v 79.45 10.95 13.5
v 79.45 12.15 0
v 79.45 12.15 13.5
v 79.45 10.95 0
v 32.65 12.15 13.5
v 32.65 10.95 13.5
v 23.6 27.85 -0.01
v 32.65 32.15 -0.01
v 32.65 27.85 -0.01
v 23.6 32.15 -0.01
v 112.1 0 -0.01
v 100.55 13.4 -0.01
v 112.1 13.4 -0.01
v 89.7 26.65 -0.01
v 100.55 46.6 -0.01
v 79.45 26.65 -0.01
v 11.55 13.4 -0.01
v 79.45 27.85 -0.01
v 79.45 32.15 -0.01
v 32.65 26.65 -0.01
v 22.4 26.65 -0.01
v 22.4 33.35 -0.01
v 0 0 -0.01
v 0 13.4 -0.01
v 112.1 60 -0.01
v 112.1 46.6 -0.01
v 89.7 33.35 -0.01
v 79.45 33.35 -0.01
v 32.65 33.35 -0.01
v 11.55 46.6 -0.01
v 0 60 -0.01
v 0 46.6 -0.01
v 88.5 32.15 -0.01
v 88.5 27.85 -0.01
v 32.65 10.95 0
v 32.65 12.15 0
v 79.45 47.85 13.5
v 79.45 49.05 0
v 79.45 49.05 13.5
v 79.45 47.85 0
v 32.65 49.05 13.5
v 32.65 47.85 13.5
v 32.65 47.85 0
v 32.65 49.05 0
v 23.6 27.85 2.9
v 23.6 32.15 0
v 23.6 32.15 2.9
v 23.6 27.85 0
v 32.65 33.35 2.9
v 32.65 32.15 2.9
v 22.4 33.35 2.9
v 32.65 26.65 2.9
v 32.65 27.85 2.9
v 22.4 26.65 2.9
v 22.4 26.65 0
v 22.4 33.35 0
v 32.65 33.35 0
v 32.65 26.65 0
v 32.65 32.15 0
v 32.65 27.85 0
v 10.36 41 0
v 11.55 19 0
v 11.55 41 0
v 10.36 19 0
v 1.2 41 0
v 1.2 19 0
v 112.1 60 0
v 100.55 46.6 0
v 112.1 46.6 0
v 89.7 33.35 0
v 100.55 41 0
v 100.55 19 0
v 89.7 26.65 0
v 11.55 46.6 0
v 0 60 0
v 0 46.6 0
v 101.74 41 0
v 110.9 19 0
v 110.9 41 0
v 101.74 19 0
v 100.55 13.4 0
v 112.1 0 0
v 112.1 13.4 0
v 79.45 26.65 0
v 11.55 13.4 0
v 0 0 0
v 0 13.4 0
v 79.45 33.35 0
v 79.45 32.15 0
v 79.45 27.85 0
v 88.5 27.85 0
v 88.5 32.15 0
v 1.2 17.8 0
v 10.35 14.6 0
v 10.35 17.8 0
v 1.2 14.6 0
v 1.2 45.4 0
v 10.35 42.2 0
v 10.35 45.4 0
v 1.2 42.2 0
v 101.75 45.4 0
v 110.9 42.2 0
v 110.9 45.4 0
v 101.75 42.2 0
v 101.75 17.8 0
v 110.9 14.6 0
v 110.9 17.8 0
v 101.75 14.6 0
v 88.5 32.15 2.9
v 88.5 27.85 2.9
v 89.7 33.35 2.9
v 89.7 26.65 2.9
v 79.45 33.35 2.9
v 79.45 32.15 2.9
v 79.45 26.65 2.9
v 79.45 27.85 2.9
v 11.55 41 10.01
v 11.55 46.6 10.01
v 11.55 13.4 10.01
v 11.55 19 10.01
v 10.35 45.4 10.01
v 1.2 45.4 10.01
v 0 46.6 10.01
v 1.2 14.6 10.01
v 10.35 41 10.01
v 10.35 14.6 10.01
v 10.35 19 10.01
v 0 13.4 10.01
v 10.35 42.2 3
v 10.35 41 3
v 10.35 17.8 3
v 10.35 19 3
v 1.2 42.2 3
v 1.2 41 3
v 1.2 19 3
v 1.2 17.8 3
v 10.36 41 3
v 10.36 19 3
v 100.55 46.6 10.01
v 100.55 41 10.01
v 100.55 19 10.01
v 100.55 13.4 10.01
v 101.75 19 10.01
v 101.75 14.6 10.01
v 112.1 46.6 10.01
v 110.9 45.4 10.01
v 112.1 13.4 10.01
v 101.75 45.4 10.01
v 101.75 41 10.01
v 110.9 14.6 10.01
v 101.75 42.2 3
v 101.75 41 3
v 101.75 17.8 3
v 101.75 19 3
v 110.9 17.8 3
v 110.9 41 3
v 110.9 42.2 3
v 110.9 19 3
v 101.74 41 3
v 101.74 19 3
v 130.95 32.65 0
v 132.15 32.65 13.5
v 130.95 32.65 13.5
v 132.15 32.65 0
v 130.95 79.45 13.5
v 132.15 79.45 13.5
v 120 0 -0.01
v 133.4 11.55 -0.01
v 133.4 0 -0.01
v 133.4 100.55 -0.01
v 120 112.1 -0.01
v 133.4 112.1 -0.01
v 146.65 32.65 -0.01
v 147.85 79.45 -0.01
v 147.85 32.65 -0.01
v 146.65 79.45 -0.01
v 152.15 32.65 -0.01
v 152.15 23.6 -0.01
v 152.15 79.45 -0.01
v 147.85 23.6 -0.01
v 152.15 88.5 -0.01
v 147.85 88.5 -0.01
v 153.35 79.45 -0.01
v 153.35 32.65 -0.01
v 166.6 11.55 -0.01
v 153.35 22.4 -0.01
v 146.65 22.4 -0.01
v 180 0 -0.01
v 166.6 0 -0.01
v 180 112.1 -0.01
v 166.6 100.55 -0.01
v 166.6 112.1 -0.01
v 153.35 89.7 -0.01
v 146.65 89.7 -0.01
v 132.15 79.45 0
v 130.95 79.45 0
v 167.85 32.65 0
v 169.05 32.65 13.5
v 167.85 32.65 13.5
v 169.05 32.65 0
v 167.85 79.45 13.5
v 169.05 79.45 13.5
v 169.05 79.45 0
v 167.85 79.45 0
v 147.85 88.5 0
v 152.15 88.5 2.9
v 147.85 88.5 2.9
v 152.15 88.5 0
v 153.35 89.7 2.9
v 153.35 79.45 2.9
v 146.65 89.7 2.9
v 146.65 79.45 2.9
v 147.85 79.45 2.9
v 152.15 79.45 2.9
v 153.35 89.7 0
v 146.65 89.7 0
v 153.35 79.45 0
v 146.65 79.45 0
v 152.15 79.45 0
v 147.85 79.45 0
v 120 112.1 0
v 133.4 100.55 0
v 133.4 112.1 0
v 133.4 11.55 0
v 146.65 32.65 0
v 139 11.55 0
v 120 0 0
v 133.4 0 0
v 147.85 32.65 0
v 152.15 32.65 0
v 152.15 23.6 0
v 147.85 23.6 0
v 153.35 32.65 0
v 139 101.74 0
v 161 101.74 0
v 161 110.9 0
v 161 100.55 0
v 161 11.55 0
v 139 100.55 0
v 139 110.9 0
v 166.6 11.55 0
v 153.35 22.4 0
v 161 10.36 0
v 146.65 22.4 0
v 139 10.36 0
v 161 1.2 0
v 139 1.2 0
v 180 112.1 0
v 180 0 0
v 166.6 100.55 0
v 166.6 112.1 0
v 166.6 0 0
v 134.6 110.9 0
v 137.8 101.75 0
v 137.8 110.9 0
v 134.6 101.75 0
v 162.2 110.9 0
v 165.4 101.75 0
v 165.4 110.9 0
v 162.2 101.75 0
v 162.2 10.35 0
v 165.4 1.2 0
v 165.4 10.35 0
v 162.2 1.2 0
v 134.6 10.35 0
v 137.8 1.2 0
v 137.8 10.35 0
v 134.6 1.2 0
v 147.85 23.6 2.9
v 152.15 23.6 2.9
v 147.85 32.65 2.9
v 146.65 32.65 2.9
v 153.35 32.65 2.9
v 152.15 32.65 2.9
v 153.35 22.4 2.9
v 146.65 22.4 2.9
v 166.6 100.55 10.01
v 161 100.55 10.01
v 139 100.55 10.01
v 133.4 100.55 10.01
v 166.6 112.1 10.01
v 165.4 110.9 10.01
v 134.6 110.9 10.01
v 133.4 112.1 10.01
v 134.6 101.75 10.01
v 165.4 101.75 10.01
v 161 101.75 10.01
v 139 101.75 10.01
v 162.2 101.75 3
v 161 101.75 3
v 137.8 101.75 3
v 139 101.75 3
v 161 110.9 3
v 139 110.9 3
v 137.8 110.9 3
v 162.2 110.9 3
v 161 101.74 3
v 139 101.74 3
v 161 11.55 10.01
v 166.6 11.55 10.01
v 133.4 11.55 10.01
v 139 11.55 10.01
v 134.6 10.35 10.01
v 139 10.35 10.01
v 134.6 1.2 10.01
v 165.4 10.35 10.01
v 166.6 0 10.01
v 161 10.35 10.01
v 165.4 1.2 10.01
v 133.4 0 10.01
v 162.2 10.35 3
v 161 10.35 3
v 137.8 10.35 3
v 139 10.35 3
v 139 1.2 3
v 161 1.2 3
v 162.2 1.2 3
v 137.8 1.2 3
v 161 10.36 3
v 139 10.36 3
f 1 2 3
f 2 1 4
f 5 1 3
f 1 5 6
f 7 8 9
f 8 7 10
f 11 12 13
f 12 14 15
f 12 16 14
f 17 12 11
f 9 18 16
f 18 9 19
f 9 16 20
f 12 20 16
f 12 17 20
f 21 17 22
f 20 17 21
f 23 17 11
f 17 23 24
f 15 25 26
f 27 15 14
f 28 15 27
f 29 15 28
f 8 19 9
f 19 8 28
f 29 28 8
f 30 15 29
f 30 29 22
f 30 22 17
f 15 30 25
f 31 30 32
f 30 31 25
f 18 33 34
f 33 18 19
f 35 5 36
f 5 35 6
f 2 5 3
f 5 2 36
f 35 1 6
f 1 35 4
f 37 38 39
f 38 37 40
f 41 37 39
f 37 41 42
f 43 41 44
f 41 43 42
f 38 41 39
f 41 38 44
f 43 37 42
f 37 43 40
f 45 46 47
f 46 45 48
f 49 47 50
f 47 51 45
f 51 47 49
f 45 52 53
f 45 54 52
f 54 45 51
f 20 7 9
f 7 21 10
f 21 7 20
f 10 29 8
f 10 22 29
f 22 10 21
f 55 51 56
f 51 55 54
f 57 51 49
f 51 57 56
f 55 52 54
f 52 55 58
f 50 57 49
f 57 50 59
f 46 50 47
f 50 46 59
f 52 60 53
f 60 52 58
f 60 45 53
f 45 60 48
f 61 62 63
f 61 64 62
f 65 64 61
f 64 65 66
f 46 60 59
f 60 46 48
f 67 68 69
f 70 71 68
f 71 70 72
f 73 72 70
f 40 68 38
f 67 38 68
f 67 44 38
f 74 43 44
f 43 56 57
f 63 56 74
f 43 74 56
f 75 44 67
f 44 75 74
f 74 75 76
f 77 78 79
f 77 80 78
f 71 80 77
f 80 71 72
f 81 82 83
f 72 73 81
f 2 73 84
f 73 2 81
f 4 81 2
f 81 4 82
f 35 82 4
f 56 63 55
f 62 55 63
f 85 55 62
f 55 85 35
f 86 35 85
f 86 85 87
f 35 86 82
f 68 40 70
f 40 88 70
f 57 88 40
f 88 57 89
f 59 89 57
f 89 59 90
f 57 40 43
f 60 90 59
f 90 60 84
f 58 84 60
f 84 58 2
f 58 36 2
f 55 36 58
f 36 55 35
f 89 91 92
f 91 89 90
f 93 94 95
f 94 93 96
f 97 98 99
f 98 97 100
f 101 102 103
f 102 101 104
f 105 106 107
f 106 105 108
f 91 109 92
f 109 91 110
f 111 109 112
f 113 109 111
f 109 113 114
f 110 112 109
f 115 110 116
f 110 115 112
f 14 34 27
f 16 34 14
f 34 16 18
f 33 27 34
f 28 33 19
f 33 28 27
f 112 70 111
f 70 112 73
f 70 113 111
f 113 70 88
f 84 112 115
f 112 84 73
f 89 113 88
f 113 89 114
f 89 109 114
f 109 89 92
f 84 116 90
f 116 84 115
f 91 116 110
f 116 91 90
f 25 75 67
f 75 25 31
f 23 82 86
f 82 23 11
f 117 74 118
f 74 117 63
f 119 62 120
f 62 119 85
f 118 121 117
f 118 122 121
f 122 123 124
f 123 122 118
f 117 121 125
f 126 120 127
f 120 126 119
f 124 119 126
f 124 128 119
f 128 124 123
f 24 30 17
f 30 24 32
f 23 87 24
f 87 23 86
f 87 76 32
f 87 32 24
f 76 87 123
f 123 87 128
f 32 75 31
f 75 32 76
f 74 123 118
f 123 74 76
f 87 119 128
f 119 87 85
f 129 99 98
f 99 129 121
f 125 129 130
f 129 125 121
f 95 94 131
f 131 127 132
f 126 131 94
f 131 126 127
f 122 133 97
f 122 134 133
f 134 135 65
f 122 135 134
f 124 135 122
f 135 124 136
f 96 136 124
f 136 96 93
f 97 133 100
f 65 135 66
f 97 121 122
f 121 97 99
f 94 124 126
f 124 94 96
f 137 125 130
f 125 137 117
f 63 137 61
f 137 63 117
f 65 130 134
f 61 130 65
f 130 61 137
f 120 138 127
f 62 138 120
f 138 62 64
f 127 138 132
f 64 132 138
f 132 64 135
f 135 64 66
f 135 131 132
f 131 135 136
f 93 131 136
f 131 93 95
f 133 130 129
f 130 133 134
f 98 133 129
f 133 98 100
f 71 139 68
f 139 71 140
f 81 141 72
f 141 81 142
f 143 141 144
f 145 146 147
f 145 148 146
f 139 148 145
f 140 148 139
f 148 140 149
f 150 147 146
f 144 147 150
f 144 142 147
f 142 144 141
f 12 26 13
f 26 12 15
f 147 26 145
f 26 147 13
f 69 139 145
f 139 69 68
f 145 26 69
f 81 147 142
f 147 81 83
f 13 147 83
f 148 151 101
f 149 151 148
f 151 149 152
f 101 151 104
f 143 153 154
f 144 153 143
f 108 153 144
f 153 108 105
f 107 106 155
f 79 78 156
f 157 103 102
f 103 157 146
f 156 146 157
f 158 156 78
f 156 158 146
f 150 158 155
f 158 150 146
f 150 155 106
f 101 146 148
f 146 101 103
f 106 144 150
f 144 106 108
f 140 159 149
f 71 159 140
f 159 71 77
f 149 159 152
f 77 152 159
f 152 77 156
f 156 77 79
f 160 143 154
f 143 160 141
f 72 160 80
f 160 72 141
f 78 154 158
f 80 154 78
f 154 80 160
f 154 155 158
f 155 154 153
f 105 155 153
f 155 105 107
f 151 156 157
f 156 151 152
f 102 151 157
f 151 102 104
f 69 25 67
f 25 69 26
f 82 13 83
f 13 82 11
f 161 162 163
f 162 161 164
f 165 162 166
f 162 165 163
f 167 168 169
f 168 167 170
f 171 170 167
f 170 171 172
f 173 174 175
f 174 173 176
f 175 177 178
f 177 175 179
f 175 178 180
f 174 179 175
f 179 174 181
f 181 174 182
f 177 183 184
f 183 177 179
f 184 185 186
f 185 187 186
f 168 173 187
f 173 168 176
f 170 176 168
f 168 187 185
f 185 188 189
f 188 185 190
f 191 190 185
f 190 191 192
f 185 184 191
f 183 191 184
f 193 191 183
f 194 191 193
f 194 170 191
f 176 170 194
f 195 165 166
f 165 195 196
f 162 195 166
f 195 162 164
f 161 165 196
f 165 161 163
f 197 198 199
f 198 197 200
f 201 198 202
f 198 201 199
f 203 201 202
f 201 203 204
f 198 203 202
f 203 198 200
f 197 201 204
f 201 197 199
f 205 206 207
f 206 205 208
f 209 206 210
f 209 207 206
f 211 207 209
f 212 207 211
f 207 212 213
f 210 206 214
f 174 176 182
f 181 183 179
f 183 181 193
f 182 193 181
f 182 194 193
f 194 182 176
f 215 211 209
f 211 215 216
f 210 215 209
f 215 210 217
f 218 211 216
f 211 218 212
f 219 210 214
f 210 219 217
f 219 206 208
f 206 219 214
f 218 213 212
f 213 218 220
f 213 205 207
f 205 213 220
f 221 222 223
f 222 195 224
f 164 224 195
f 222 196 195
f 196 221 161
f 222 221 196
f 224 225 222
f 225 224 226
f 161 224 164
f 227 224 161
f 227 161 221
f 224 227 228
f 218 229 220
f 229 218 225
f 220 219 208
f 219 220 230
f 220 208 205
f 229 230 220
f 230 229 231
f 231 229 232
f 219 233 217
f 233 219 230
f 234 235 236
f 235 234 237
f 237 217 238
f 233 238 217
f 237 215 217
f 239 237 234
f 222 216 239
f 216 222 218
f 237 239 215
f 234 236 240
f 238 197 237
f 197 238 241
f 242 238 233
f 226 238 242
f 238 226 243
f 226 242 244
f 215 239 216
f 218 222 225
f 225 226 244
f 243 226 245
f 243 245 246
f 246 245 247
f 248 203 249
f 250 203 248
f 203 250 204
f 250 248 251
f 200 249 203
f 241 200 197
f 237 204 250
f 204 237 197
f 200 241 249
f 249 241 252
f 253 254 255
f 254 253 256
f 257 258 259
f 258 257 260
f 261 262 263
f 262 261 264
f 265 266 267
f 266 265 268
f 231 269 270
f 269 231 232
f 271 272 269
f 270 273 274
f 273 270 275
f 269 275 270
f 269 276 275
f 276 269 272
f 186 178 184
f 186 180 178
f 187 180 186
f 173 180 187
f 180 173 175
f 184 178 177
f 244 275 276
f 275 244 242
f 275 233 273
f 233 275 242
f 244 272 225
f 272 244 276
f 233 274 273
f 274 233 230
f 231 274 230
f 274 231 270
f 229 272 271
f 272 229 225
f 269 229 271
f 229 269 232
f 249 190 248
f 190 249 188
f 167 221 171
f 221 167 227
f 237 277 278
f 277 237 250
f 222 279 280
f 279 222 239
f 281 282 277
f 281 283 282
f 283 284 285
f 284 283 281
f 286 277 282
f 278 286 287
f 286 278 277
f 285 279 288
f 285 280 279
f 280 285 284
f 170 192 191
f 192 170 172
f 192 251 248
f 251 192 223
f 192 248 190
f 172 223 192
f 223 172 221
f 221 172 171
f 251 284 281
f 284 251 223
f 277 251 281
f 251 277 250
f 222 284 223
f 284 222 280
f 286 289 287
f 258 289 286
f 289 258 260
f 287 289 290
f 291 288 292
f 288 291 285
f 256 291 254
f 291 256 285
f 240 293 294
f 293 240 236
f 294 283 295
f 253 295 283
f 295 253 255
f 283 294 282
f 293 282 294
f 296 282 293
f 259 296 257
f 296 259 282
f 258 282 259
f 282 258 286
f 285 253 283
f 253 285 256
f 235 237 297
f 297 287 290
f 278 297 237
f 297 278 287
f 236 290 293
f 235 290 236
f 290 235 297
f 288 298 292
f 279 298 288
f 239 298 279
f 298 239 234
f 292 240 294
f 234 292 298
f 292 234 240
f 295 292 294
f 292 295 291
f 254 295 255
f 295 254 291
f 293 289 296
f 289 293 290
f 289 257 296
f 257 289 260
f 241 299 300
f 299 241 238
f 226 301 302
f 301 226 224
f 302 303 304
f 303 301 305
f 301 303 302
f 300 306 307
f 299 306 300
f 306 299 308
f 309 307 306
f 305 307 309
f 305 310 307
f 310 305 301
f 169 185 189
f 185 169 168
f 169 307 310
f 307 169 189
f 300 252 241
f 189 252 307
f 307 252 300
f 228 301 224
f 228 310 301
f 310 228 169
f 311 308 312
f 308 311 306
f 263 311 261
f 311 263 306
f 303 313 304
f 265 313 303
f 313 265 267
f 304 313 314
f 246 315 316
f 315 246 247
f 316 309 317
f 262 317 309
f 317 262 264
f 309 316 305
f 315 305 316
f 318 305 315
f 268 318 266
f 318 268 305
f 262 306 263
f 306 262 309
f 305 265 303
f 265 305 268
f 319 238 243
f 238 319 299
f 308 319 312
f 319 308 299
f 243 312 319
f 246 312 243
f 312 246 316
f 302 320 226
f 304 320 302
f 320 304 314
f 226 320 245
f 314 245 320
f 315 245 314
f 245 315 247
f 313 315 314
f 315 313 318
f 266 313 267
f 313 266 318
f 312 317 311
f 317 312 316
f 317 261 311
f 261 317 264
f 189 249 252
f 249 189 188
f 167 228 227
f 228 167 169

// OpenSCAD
// file: ../../Elements/FrameCouplingBracket.scad
// Fischertechnik Box Library
// Coupling Bracket
// 38252

use <../Base/Constants.scad>
use <../ModelBase/Simple.scad>
use <../ModelBase/Complex.scad>

width = 9.15 - getTolerance();
depth = 30;
height = 10;

// getFrameCouplingBracketSpace()
// Gets the space the frame coupling bracket needs as width and depth (.x and .y as a list)

function getFrameCouplingBracketSpace() = getFrameOuterVolume([width, depth, height]);

// FrameCouplingBracket()
// Coupling Bracket
// 38252

module FrameCouplingBracket() {
    cutOffWidth = 2 * getDividerThickness();
    cutOffDepth = 22;
    cutOffHeight = height + 2*getExcess();
    
    innerVolume = getFrameInnerVolume([width, depth, height]);
    cutOffXOffset = innerVolume.x + 2*getExcess();
    cutoffYOffset = (innerVolume.y - cutOffDepth) / 2 + getDividerThickness();
    
    difference() {
        Frame(innerVolume, tolerance=0);
        translate([cutOffXOffset, cutoffYOffset, 0])
            cube([cutOffWidth, cutOffDepth, cutOffHeight]);
    }
    
    railWidth = innerVolume.x + 2*getExcess();
    railDepth = getDividerThickness();
    railHeight = 3 + getExcess();
    
    railXOffset = getDividerThickness() - getExcess();
    railYOffset1 = cutoffYOffset - getDividerThickness();
    railYOffset2 = cutoffYOffset + cutOffDepth;
    
    translate([railXOffset, 0, -getExcess()]) {
        translate([0, railYOffset1])
            cube([railWidth, railDepth, railHeight]);
        translate([0, railYOffset2])
            cube([railWidth, railDepth, railHeight]);
    }
}

// Test
color("lightgray")
FrameCouplingBracket();
// file: ../../Elements/HolderCompleteBucket.scad
// Fischertechnik Box Library
// Complete Bucket Holder
// 37354, 37353, 37355, 38257

use <../Base/Constants.scad>
use <../ModelBase/Simple.scad>
use <../ModelBase/Complex.scad>

width = 89;
depth = 60;

// getHolderCompleteBucketSpace()
// Gets the space the holder complete bucket needs as width and depth (.x and .y as a list)

function getHolderCompleteBucketSpace() = [width, depth];

// HolderCompleteBucket()
// Holder for complete bucket with three middle and two side parts, 
// and a middle axis.
// 37354, 37353, 37355, 38257

module HolderCompleteBucket() {
    railWidth = 46.8;
    railHeight = 13.5;
    railDistance = 35.7;
    outerPinFrameLength = 10.25;
    innerPinFrameLength = outerPinFrameLength - 3*getDividerThickness();
    innerPinFrameDepth = 4.3;
    outerPinFrameDepth = innerPinFrameDepth + 2*getDividerThickness();
    pinFrameHeight = 2.9;
    
    Space(getHolderCompleteBucketSpace());

    railXOffset = (getHolderCompleteBucketSpace().x - railWidth) / 2;
    railYOffset1 = (getHolderCompleteBucketSpace().y - railDistance) / 2 - getDividerThickness();
    railYOffset2 = railYOffset1 + railDistance + getDividerThickness();    
    
    translate([railXOffset, 0, 0]) {
        translate([0, railYOffset1, 0])
            Wall([railWidth, getDividerThickness(), railHeight]);
        translate([0, railYOffset2, 0])
            Wall([railWidth, getDividerThickness(), railHeight]);
    }
    
    midYOffset = (getHolderCompleteBucketSpace().y - outerPinFrameDepth) / 2;
    
    railXOffset1 = railXOffset - outerPinFrameLength;
    translate([railXOffset1, midYOffset, 0])
        DockableFrame([innerPinFrameLength, innerPinFrameDepth, pinFrameHeight], wallRight=false, tolerance=0);
    
    railXOffset2 = outerPinFrameLength + railXOffset + railWidth;
    translate([railXOffset2, midYOffset, 0])
        mirror([1,0,0])
            DockableFrame([innerPinFrameLength, innerPinFrameDepth, pinFrameHeight], wallRight=false, tolerance=0);
}

// Test
color("lightgray")
HolderCompleteBucket();
// file: ../../Base/Boxes.scad
// Fischertechnik Box Foundation
// Pre-designed Boxes

use <Constants.scad>

include <PlacementOptions.scad>

box190Width = 190;
box190Depth = 130;
box130Width = 130;
box130Depth = 95;
boxUsageHeight = 33.9;
boxWallThickness = 2.4;
boxBaseThickness = 1.0;

// getBoxWallThickness()
// Gets the wall thickness of a Fischertechnik Box

function getBoxWallThickness() = boxWallThickness;

// Gets the usable height of a fischertechnik box
function getBoxUsageHeight() = boxUsageHeight;

// Gets the thickness of the Fischertechnik box base.
function getBoxBaseThickness() = boxBaseThickness;

// Gets the usable inner space of a Box 190 as an x/y-list
function getBox190Space() = [
    box190Width - 2*getBoxWallThickness(), 
    box190Depth - 2*getBoxWallThickness() ];

// Imports the Fischertechnik empty box 130x190 mm and places it at position 0,0
// 190x130 are the outer sizes, the inner space is slightly smaller. Use getBox190Space() to get the inner sizes.
// This module needs the STL file "Fischertechnik Box 130x190.stl" in the library path.
// The box is positioned that the usable inner space is at the 0,0,0 position. The

module Box190() {
    translate([-getBoxWallThickness(),-getBoxWallThickness(),-getBoxBaseThickness()])
        import("Fischertechnik Box 130x190.stl", convexity=3);
}

// Gets the usable inner space of a Box 130 as an x/y-list
function getBox130Space() = [
    box130Width - 2*getBoxWallThickness(), 
    box130Depth - 2*getBoxWallThickness() ];

// Imports the Fischertechnik empty box 95x130 mm and places it at position 0,0
// 190x130 are the outer sizes, the inner space is slightly smaller. Use getBox190Space() to get the inner sizes.
// This module needs the STL file "Fischertechnik Box 95x130.stl" in the library path.
// The box is positioned that the usable inner space is at the 0,0,0 position. The

module Box130() {
    translate([-getBoxWallThickness(),-getBoxWallThickness(),-getBoxBaseThickness()])
        import("Fischertechnik Box 95x130.stl", convexity=3);
}

// Creates a web at the specified box walls
// corner 0 = LowerLeft, 1 = UpperLeft, 2 = UpperRight, 3 = LowerRight
// side 0 = LeftOfCorner, 1 = RightOfCorner
// distance = Distance in mm from the corner
// box = inner width and depth of the box (default: Box 190)
// webWidth = length of the web (default is 3 mms)
// webThickness = thickness of the web (default is 1 mm)

module BoxWeb(corner, side, distance, box=getBox190Space(), webWidth=3, webThickness=1.0) {
    sink = getBoxWallThickness()/2;

    width = (corner % 2 == 0) ? 
            (side == LeftOfCorner ? webWidth : webThickness) :
            (side == LeftOfCorner ? webThickness : webWidth);

    depth = (corner % 2 == 0) ? 
            (side == RightOfCorner ? webWidth : webThickness) :
            (side == RightOfCorner ? webThickness : webWidth);
    
    xDiff = corner == LowerLeft ? 
                (side == LeftOfCorner ? -sink : distance) :
            (corner == UpperLeft ?                
                (side == LeftOfCorner ? distance : -sink) :
            (corner == UpperRight ?
                (side == LeftOfCorner ? box.x-webWidth+sink : box.x-distance-webThickness) :
                (side == LeftOfCorner ? box.x-distance-webThickness: box.x-webWidth+sink)));

    yDiff = corner == LowerLeft ? 
                (side == RightOfCorner ? -sink : distance) :
            (corner == UpperLeft ?
                (side == RightOfCorner ? box.y-distance : box.y-webWidth+sink) :
            (corner == UpperRight ?
                (side == RightOfCorner ? box.y-webWidth+sink : box.y-distance) :
                (side == RightOfCorner ? distance : -sink)));
    
    translate([xDiff, yDiff, -getExcess()])
        cube([width, depth, boxUsageHeight + 2*getExcess()]);
}
// file: ../../Base/Rotation.scad
// Fischertechnik Box Foundation
// Geometry Helpers Rotation

include <PlacementOptions.scad>

// getRotatedSpace(space, rotation=NoRotation)
// Rotates the space dependent on the specified rotation

function getRotatedSpace(space, rotation=NoRotation) = [
    (rotation == Rotate90 || rotation == Rotate270) ? space.y : space.x,
    (rotation == Rotate90 || rotation == Rotate270) ? space.x : space.y
];

// Rotates the given space around the fixed left lower corner
// space = the space the children needs as width/depth list [width,depth]
// rotation = 0 Rotate0 degrees, 1 Rotate90 degrees, 2 Rotate180 degrees, 3 Rotate270 degrees (equivalent to -90)

module RotateFix(space, rotation=Rotate0) {
    dy = (rotation == Rotate0 || rotation == Rotate270) ? 0 :
        (rotation == Rotate90) ? space.x :
        space.y;
    dx = (rotation < Rotate180) ? 0 :
        (rotation == Rotate180) ? space.x :
        space.y;
    
    translate([dx, dy, 0])
        rotate([0, 0, rotations[rotation]])
            children();
}
// file: ../../Base/Alignment.scad
// Fischertechnik Box Foundation
// Geometry Helpers Alignment

include <PlacementOptions.scad>

// getAlignedX(elementWidth, spaceWidth, align=AlignRight, offset=0)
// Gets the aligned X offset of an element with the given
// width in the given space.
// elementWidth = The width of the element to positon
// spaceWidth = The space where the element should be aligned
// align = 0 AlignLeft, 1 AlignCenter, 2 AlignRight
// offset = an optional offset from the aligned position. When
// aligned left or centered, then positive values are in X direction.
// When aligned right then positive values are in negative X direction.

function getAlignedX(elementWidth, spaceWidth, align=AlignRight, offset=0) =
    (align == AlignLeft) ?
        offset :
        ((align == AlignCenter) ?
        (spaceWidth - elementWidth)/2 + offset :
        spaceWidth - offset - elementWidth);

// getAlignedY(elementDepth, spaceDepth, align=AlignTop, offset=0)
// Gets the aligned Y offset of an element with the given
// depth in the given space.
// elementDepth = The depth of the element to positon
// spaceDepth = The space where the element should be aligned
// align = 0 AlignBottom, 1 AlignCenter, 2 AlignTop
// offset = an optional offset from the aligned position. When
// aligned bottom or centered, then positive values are in Y direction.
// When aligned top then positive values are in negative Y direction.

function getAlignedY(elementDepth, spaceDepth, align=AlignTop, offset=0) =
    (align == AlignBottom) ?
        offset :
        ((align == AlignCenter) ?
        (spaceDepth - elementDepth)/2 + offset :
        spaceDepth - offset - elementDepth);
// file: ../../Base/Constants.scad
// Fischertechnik Box Foundation
// Constants

// Constant values necessary for multiple elements

// Base constants
dividerThickness = 1.2;
excess = 0.01;
fragments = 90;
tolerance = 0.8;

// Gets the thickness of a divider 
function getDividerThickness() = dividerThickness;

// Gets the excess that is used to merge walls into each other
function getExcess() = excess;

// Gets amount of fragments of a cylinder
function getFragments() = fragments;

// Gets the inner tolerance of a frame to each side
function getTolerance() = tolerance;


// Fischertechnik specific constants
axisDiameter = 4;
axisBottomDiameter = axisDiameter + 1;
standardEdgeDistance = 2.5;
standardWebDistance = 11.5;
standardCornerLength = 15;
tubeWallFactor = 1.6;

// Gets axis diameter
function getAxisDiameter() = axisDiameter;

// Gets axis bottom diameter for thicker part at the bottom
function getAxisBottomDiameter() = axisBottomDiameter;

// gets the standard distance to the wall of the box for dockable frames with webs
function getStandardEdgeDistance() = standardEdgeDistance;

// gets the standard distance of each web to the corner of the dockable frame
function getStandardWebDistance() = standardWebDistance;

// gets the standard length of the corner walls of a dockable frame
function getStandardCornerLength() = standardCornerLength;

// gets the wall thickness of a tube.
function getTubeWallThickness() = tubeWallFactor * getDividerThickness();
// file: ../../Base/PlacementOptions.scad
// Fischertechnik Box Foundation
// Placement Options

// Alignment
NoAlign = 0;
AlignLeft = 1;
AlignBottom = 2;
AlignCenter = 3;
AlignRight = 4;
AlignTop = 5;

// Element rotation degree steps
rotations = [0, -90, -180, -270];

// Rotation
NoRotation = 0;
Rotate0 = 0;
Rotate90 = 1;
Rotate180 = 2;
Rotate270 = 3;

// Docking (seen from above)
NoDock = -1;
DockLeft = 0;
DockTop = 1;
DockRight = 2;
DockCorner = 2;
DockBottom = 3;

// Web corners
LowerLeft = 0;
UpperLeft = 1;
UpperRight = 2;
LowerRight = 3;

// Web position relative to corner
LeftOfCorner = 0;
RightOfCorner = 1;
// file: ../../Elements/ComboCompleteBucketPlusCouplingBrackets.scad
// Fischertechnik Box Library
// Combo Complete Bucket plus Coupling Brackets
// 38252, 37354, 37353, 37355, 38257

use <../Base/Constants.scad>
use <../ModelBase/Simple.scad>
use <../ModelBase/Complex.scad>

use <HolderCompleteBucket.scad>
use <FrameCouplingBracket.scad>

// getComboCompleteBucketPlusCouplingBracketsSpace()
// Gets the space the combo complete bucket plus two coupling brackets needs as width and depth (.x and .y as a list)

function getComboCompleteBucketPlusCouplingBracketsSpace() = [
    2*getFrameCouplingBracketSpace().x + getHolderCompleteBucketSpace().x, 
    getHolderCompleteBucketSpace().y];

// ComboCompleteBucketPlusCouplingBrackets()
// Holder for complete bucket with three middle and two side parts, 
// and a middle axis plus two frame coupling brackets.
// 37354, 37353, 37355, 38257, 38252

module ComboCompleteBucketPlusCouplingBrackets() {
    Space(getComboCompleteBucketPlusCouplingBracketsSpace());
    
    translate([getFrameCouplingBracketSpace().x, 0, 0])
        HolderCompleteBucket();
    
    yOffset = (getHolderCompleteBucketSpace().y - getFrameCouplingBracketSpace().y) / 2;
    translate([0, yOffset, 0])
        FrameCouplingBracket();
    
    mirror([1, 0, 0])
        translate([-getComboCompleteBucketPlusCouplingBracketsSpace().x, yOffset, 0])
            FrameCouplingBracket();
}

// Test
color("lightgray") {
ComboCompleteBucketPlusCouplingBrackets();
}
// file: ../../Base/Deployment.scad
// Fischertechnik Box Foundation
// Geometry Helpers Deployment

use <Constants.scad>
use <Placement.scad>
use <Rotation.scad>

include <PlacementOptions.scad>

// getWidth(spaces, rotations, count, i=0)
// Gets the sum of the width of count specified spaces, including rotations for each space.
// spaces = List of spaces from which the width should be added. Used internally for DeployRow.
// rotations = specify rotations for each space to get its correct width
// count = The count of spaces from the specified spaces that should be included in the sum (for recursive call)
// i = The space index offset used to start to add (for recursive call)

function getWidth(spaces, rotations, count, i=0) = 
    (i < count) ? 
        getRotatedSpace(spaces[i], rotations[i]).x + getWidth(spaces, rotations, count, i+1) : 
        0;

// getX(spaces, rotations, distance, i)
// Calculates the X position of the space with the index i, when the spaces are placed with the given
// equal distances. Used internally for DeployRow.
// spaces = List of spaces from which the width should be added
// rotations = specify rotations for each space to get its correct width
// distance = Equal distance between each space
// i = Index of the space to get its X position for

function getX(spaces, rotations, distance, i) = 
    (i == 0) ? 
        0 :
        (getRotatedSpace(spaces[i-1], rotations[i-1]).x + distance + getX(spaces, rotations, distance, i-1));

// DeployRow(width, spaces, rotations)
// Deploys the elements in the specified width with equal distances.
// rowWidth = The width of the row in mm.
// spaces = The spaces of all elements to deploy.
// rotations = The rotations of each element: 0 Rotate0 0 degrees, 1 Rotate90 90 degrees, 
// 2 Rotate180 180 degrees, 3 Rotate270 270 degrees (equivalent to -90).

module DeployRow(rowWidth, spaces, rotations) {
    distance = (rowWidth - getWidth(spaces, rotations, len(spaces))) / (len(spaces)-1);
    
    for (i = [0:1:$children-1]) {
        x = getX(spaces, rotations, distance, i);
        translate([x, 0])
            RotateFix(spaces[i], rotations[i])
                children(i);
    }
}

// DeploySame(space, elementSpace, columns=2, rows=1, rotation=Rotate0)
// Deploys columns and rows of the specified child in the specified space with
// equal distances
// space = The space where the element copies are deployed
// elementSpace = The space the child needs
// columns = Count of elements per row
// rows = Count of rows deployed
// rotation = The rotation of the child that will be applied

module DeploySame(space, elementSpace, columns=2, rows=1, rotation=Rotate0) {
    
    elementWidth = getRotatedSpace(elementSpace, rotation).x;
    columnDistance = (space.x - columns * elementWidth) / (columns > 1 ? columns - 1 : 1);
    endColumnOffset = space.x - elementWidth;
    columnOffsetStep = elementWidth + columnDistance;
    
    elementDepth = getRotatedSpace(elementSpace, rotation).y;
    rowDistance = (space.y - rows * elementDepth) / (rows > 1 ? rows - 1 : 1);
    endRowOffset = space.y - elementDepth;
    rowOffsetStep = elementDepth + rowDistance;
    
    for (rowOffset = [0:rowOffsetStep:endRowOffset]) {
        for (columnOffset = [0:columnOffsetStep:endColumnOffset]) {
            translate([columnOffset, rowOffset])
                RotateFix(elementSpace, rotation)
                    children(0);
        }
    }
}

// getMergedRowWidth(spaces, rotations, count, i=0)
// Gets the width of the merged spaces with the specified rotations.
// Merging works all elements with two frame walls. 
// The right and left walls are merged into one single wall.
// spaces = List of spaces from which the width should be added.
// rotations = specify rotations for each space to get its correct width
// count = The count of spaces from the specified spaces that should be included in the sum (for recursive call)
// i = The space index offset used to start to add (for recursive call)

function getMergedRowWidth(spaces, rotations, count, i=0) =
    (i < count) ? 
        getRotatedSpace(spaces[i], rotations[i]).x + getWidth(spaces, rotations, count, i+1) - (i > 0 ? getDividerThickness() : 0) : 
        0;

// MergeRow(spaces, rotations, dividerThickness=0.8)
// Deploys the children so that all walls of the neighbors are merged in a single common wall.
// spaces = List of spaces of the children to get the sizes from.
// rotations = specify rotations for each space to get its correct width
// dividerThickness = Thickness of all dividers of the elements (default is 0.8)

module MergeRow(spaces, rotations, dividerThickness = getDividerThickness()) {
    for (i = [0:1:$children-1]) {
        x = getX(spaces, rotations, -getDividerThickness(), i);
        translate([x, 0, 0])
            RotateFix(spaces[i], rotations[i])
                children(i);
    }
}

// Merge(count, space, rotation, dividerThickness=0.8)
// Deploys the child count times so that all walls of the neighbors are merged in a single common wall.
// space = Space of the child to get the sizes from.
// rotation = rotation of the child to get the correct width
// dividerThickness = Thickness of all dividers of the element (default is 0.8)

module Merge(count, space, rotation, dividerThickness = getDividerThickness()) {
    x = getRotatedSpace(space, rotation).x - getDividerThickness();
    for (offset = [0:x:(count-1)*x]) {
        echo(offset);
        translate([offset, 0, 0])
            RotateFix(space, rotation)
                children(0);
    }
}
// file: ../../Base/Placement.scad
// Fischertechnik Box Foundation
// Geometry Helpers Placement

use <Constants.scad>
use <Alignment.scad>
use <Rotation.scad>
use <Boxes.scad>

include <PlacementOptions.scad>

// Place(x=0, y=0, elementSpace=[0,0], alignX=AlignLeft, alignY=AlignBottom, rotation=Rotate0, boxSpace=getBox190Space())
// Places the child at the specified position
// y = Y-Position. This is a relative position when an X aligment is specified.
// x = X-Position. This is a relative position when an Y aligment is specified.
// elementSpace = space of the element to be placed [x,y]
// alignX = -1=NoAlign, 0 AlignLeft, 1 AlignCenter, 3 AlignRight (elementSpace and boxSpace required!)
// alignY = -1=NoAlign, 2 AlignBottom, 1 AlignCenter, 4 AlignTop (elementSpace and boxSpace required!)
// rotation = 0 Rotate0 0 degrees, 1 Rotate90 90 degrees, 
// 2 Rotate180 180 degrees, 3 Rotate270 270 degrees (equivalent to -90)
// boxSpace = Inner space of the box where the placement occurs [x,y] - default is Box 190x130 inner space

module Place(x=0, y=0, elementSpace=[0,0], 
  alignX=AlignLeft, alignY=AlignBottom, 
  rotation=NoRotation, boxSpace=getBox190Space()) {

    module Position(x, y, space, rotation=Rotate0) {
        translate([x, y, 0])
            RotateFix(space, rotation)
                children(0);
    }

    space = getRotatedSpace(elementSpace, rotation);
    alignedX = getAlignedX(space.x, boxSpace.x, alignX, x);
    alignedY = getAlignedY(space.y, boxSpace.y, alignY, y);
    Position(alignedX, alignedY, elementSpace, rotation)
        children(0);
}

// Center(space=getBox130Space(), elementSpace=[0,0])
// space = Space where the children is centered. For cylinder use centered=true and no elementSpace.
// elementSpace = space of the element to be centered [x,y]

module Center(space=getBox190Space(), elementSpace=[0,0]) {
    translate([(space.x - elementSpace.x) / 2, (space.y - elementSpace.y) / 2])
        children(0);
}

// CenterHorizontal(width=0, y=0, offset=0, space=getBox130Space())
// space = Space where the children is centered. For cylinder use centered=true and no elementSpace.
// elementSpace = space of the element to be centered [x,y]

module CenterHorizontal(width=0, y=0, offset=0, space=getBox190Space()) {
    translate([(space.x - width) / 2 + offset, y])
        children(0);
}

// CenterVertical(depth=0, x=0, offset=0, space=getBox130Space())
// space = Space where the children is centered. For cylinder use centered=true and no elementSpace.
// elementSpace = space of the element to be centered [x,y]

module CenterVerticalal(depth=0, x=0, offset=0, space=getBox190Space()) {
    translate([x, (space.y - depth) / 2 + offset])
        children(0);
}
// main file
// Fischertechnik Box Foundation
// Elements
// Test AxisHub

use <../../Base/Placement.scad>
use <../../Base/Deployment.scad>
use <../../Elements/ComboCompleteBucketPlusCouplingBrackets.scad>

include <../../Base/PlacementOptions.scad>

ComboCompleteBucketPlusCouplingBrackets();

Place(120, 0, elementSpace=getComboCompleteBucketPlusCouplingBracketsSpace(), rotation=Rotate90)
    ComboCompleteBucketPlusCouplingBrackets();
